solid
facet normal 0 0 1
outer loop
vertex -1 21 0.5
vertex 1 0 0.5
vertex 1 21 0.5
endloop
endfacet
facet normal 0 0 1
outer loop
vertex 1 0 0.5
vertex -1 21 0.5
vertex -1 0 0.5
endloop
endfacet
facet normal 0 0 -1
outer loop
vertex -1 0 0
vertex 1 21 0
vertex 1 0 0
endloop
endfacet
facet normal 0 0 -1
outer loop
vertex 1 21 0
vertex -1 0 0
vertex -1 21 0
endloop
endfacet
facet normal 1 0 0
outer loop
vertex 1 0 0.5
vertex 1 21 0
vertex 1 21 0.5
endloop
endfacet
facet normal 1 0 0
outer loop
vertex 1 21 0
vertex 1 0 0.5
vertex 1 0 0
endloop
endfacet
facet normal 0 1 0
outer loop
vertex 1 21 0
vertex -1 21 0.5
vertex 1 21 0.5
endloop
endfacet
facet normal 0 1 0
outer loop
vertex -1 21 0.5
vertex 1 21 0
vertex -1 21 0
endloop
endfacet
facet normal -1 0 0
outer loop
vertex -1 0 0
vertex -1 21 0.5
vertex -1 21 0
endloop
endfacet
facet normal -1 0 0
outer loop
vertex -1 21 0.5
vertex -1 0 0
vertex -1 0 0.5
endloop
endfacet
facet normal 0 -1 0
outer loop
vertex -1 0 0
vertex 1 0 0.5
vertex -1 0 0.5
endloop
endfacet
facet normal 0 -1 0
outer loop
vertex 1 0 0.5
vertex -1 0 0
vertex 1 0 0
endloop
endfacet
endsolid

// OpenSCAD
module channel(start, end, width, height, flip, z_offset){
	
	dX = end[0] - start[0];
	dY = end[1] - start[1];
	angle_deg = atan2(dY, dX);
	dXPow = pow(dX,2);
	dYPow = pow(dY,2);
	length = sqrt(dXPow + dYPow);
	translate([start[0]+(width/2)*sin(angle_deg),start[1]-cos(angle_deg)*(width/2), z_offset]){
		if (flip)
		{	
			translate([0,0,-height])
			{
				rotate([0,0,angle_deg])
					{
					cube([length+width/2,width,height]);
				}
			
			}
		}
		else
		{
			rotate([0,0,angle_deg])
			{
				cube([length+width/2,width,height]);
			}
		}
	}
}

channel(start=[0,0],end=[0,20],width=2,height=.5,flip= false,z_offset=0);
